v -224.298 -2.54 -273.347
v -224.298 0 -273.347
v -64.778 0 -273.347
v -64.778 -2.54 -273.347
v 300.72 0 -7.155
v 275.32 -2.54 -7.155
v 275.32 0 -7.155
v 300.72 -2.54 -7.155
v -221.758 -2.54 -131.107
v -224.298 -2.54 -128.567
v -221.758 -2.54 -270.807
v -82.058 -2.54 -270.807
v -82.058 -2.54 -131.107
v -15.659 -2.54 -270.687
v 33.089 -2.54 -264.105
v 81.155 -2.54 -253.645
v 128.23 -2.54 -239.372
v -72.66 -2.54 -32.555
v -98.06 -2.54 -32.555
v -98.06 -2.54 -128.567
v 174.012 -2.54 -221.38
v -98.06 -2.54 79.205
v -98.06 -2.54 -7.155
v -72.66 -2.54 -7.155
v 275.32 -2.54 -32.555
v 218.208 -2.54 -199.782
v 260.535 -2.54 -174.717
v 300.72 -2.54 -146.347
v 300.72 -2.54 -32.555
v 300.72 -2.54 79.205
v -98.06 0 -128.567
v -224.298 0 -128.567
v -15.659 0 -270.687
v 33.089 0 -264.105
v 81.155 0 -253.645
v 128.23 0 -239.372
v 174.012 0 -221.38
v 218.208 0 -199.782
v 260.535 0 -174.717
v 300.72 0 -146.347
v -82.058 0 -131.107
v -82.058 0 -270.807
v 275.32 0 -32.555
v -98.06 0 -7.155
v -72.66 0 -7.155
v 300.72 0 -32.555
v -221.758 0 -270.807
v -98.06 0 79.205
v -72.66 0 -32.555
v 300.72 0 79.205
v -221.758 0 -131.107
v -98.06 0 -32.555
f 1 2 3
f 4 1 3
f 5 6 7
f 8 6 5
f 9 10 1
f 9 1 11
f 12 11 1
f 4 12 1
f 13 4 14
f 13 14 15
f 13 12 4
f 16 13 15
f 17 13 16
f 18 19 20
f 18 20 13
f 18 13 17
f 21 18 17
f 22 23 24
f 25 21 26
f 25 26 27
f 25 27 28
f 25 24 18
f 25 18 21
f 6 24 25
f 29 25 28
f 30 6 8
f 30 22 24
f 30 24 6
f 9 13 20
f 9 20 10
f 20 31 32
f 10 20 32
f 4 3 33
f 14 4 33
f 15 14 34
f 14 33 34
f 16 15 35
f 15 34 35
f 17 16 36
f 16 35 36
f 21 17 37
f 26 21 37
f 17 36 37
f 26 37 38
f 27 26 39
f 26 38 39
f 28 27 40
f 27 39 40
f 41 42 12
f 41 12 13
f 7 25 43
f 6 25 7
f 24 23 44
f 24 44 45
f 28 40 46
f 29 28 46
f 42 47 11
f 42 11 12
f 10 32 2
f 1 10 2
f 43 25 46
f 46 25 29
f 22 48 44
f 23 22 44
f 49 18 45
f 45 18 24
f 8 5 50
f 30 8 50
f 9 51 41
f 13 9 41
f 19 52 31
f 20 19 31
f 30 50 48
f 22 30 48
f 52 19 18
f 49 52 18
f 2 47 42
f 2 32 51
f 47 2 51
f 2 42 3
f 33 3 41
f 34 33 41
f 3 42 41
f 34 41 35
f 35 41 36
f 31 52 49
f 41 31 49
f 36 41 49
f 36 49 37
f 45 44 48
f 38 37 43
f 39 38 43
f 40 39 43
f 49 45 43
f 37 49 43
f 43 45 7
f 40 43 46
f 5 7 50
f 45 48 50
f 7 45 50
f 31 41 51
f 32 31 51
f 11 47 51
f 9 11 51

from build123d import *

# Parameters (mm, degrees)
F0_W     = 139.7
F0_H     = 139.7
F1_DEPTH = 2.54
F2_W     = 25.4
F2_H     = 25.4
F3_DEPTH = 25.4
F4_W     = 25.4
F4_H     = 25.4
F5_DEPTH = 25.4


with BuildPart() as f1:
    # F0 (on Front) → F1 (new body)
    with BuildSketch(Plane.XZ):
        with BuildLine():
            Line((300.720289, 79.205069), (-98.059711, 79.205069))
            Line((-98.059711, 79.205069), (-98.059711, -128.566931))
            Line((-98.059711, -128.566931), (-224.297711, -128.566931))
            Line((-224.297711, -128.566931), (-224.297711, -273.346931))
            Line((-224.297711, -273.346931), (-82.057711, -273.346931))
            Line((-82.057711, -273.346931), (-64.778368, -273.346931))
            ThreePointArc((-64.778368, -273.346931), (128.230167, -239.372335), (300.720289, -146.346931))
            Line((300.720289, -146.346931), (300.720289, 79.205069))
        make_face()
        with Locations((-151.907711, -200.956931)):
            Rectangle(F0_W, F0_H, mode=Mode.SUBTRACT)
    extrude(amount=F1_DEPTH)

    # F2 (on face) → F3 (cut)
    with BuildSketch(Plane.XZ.offset(2.54)):
        with Locations((-85.359711, -19.854931)):
            Rectangle(F2_W, F2_H)
    extrude(amount=-F3_DEPTH, mode=Mode.SUBTRACT)

    # F4 (on face) → F5 (cut)
    with BuildSketch(Plane.XZ.offset(2.54)):
        with Locations((288.020289, -19.854931)):
            Rectangle(F4_W, F4_H)
    extrude(amount=-F5_DEPTH, mode=Mode.SUBTRACT)


solid = f1.part
